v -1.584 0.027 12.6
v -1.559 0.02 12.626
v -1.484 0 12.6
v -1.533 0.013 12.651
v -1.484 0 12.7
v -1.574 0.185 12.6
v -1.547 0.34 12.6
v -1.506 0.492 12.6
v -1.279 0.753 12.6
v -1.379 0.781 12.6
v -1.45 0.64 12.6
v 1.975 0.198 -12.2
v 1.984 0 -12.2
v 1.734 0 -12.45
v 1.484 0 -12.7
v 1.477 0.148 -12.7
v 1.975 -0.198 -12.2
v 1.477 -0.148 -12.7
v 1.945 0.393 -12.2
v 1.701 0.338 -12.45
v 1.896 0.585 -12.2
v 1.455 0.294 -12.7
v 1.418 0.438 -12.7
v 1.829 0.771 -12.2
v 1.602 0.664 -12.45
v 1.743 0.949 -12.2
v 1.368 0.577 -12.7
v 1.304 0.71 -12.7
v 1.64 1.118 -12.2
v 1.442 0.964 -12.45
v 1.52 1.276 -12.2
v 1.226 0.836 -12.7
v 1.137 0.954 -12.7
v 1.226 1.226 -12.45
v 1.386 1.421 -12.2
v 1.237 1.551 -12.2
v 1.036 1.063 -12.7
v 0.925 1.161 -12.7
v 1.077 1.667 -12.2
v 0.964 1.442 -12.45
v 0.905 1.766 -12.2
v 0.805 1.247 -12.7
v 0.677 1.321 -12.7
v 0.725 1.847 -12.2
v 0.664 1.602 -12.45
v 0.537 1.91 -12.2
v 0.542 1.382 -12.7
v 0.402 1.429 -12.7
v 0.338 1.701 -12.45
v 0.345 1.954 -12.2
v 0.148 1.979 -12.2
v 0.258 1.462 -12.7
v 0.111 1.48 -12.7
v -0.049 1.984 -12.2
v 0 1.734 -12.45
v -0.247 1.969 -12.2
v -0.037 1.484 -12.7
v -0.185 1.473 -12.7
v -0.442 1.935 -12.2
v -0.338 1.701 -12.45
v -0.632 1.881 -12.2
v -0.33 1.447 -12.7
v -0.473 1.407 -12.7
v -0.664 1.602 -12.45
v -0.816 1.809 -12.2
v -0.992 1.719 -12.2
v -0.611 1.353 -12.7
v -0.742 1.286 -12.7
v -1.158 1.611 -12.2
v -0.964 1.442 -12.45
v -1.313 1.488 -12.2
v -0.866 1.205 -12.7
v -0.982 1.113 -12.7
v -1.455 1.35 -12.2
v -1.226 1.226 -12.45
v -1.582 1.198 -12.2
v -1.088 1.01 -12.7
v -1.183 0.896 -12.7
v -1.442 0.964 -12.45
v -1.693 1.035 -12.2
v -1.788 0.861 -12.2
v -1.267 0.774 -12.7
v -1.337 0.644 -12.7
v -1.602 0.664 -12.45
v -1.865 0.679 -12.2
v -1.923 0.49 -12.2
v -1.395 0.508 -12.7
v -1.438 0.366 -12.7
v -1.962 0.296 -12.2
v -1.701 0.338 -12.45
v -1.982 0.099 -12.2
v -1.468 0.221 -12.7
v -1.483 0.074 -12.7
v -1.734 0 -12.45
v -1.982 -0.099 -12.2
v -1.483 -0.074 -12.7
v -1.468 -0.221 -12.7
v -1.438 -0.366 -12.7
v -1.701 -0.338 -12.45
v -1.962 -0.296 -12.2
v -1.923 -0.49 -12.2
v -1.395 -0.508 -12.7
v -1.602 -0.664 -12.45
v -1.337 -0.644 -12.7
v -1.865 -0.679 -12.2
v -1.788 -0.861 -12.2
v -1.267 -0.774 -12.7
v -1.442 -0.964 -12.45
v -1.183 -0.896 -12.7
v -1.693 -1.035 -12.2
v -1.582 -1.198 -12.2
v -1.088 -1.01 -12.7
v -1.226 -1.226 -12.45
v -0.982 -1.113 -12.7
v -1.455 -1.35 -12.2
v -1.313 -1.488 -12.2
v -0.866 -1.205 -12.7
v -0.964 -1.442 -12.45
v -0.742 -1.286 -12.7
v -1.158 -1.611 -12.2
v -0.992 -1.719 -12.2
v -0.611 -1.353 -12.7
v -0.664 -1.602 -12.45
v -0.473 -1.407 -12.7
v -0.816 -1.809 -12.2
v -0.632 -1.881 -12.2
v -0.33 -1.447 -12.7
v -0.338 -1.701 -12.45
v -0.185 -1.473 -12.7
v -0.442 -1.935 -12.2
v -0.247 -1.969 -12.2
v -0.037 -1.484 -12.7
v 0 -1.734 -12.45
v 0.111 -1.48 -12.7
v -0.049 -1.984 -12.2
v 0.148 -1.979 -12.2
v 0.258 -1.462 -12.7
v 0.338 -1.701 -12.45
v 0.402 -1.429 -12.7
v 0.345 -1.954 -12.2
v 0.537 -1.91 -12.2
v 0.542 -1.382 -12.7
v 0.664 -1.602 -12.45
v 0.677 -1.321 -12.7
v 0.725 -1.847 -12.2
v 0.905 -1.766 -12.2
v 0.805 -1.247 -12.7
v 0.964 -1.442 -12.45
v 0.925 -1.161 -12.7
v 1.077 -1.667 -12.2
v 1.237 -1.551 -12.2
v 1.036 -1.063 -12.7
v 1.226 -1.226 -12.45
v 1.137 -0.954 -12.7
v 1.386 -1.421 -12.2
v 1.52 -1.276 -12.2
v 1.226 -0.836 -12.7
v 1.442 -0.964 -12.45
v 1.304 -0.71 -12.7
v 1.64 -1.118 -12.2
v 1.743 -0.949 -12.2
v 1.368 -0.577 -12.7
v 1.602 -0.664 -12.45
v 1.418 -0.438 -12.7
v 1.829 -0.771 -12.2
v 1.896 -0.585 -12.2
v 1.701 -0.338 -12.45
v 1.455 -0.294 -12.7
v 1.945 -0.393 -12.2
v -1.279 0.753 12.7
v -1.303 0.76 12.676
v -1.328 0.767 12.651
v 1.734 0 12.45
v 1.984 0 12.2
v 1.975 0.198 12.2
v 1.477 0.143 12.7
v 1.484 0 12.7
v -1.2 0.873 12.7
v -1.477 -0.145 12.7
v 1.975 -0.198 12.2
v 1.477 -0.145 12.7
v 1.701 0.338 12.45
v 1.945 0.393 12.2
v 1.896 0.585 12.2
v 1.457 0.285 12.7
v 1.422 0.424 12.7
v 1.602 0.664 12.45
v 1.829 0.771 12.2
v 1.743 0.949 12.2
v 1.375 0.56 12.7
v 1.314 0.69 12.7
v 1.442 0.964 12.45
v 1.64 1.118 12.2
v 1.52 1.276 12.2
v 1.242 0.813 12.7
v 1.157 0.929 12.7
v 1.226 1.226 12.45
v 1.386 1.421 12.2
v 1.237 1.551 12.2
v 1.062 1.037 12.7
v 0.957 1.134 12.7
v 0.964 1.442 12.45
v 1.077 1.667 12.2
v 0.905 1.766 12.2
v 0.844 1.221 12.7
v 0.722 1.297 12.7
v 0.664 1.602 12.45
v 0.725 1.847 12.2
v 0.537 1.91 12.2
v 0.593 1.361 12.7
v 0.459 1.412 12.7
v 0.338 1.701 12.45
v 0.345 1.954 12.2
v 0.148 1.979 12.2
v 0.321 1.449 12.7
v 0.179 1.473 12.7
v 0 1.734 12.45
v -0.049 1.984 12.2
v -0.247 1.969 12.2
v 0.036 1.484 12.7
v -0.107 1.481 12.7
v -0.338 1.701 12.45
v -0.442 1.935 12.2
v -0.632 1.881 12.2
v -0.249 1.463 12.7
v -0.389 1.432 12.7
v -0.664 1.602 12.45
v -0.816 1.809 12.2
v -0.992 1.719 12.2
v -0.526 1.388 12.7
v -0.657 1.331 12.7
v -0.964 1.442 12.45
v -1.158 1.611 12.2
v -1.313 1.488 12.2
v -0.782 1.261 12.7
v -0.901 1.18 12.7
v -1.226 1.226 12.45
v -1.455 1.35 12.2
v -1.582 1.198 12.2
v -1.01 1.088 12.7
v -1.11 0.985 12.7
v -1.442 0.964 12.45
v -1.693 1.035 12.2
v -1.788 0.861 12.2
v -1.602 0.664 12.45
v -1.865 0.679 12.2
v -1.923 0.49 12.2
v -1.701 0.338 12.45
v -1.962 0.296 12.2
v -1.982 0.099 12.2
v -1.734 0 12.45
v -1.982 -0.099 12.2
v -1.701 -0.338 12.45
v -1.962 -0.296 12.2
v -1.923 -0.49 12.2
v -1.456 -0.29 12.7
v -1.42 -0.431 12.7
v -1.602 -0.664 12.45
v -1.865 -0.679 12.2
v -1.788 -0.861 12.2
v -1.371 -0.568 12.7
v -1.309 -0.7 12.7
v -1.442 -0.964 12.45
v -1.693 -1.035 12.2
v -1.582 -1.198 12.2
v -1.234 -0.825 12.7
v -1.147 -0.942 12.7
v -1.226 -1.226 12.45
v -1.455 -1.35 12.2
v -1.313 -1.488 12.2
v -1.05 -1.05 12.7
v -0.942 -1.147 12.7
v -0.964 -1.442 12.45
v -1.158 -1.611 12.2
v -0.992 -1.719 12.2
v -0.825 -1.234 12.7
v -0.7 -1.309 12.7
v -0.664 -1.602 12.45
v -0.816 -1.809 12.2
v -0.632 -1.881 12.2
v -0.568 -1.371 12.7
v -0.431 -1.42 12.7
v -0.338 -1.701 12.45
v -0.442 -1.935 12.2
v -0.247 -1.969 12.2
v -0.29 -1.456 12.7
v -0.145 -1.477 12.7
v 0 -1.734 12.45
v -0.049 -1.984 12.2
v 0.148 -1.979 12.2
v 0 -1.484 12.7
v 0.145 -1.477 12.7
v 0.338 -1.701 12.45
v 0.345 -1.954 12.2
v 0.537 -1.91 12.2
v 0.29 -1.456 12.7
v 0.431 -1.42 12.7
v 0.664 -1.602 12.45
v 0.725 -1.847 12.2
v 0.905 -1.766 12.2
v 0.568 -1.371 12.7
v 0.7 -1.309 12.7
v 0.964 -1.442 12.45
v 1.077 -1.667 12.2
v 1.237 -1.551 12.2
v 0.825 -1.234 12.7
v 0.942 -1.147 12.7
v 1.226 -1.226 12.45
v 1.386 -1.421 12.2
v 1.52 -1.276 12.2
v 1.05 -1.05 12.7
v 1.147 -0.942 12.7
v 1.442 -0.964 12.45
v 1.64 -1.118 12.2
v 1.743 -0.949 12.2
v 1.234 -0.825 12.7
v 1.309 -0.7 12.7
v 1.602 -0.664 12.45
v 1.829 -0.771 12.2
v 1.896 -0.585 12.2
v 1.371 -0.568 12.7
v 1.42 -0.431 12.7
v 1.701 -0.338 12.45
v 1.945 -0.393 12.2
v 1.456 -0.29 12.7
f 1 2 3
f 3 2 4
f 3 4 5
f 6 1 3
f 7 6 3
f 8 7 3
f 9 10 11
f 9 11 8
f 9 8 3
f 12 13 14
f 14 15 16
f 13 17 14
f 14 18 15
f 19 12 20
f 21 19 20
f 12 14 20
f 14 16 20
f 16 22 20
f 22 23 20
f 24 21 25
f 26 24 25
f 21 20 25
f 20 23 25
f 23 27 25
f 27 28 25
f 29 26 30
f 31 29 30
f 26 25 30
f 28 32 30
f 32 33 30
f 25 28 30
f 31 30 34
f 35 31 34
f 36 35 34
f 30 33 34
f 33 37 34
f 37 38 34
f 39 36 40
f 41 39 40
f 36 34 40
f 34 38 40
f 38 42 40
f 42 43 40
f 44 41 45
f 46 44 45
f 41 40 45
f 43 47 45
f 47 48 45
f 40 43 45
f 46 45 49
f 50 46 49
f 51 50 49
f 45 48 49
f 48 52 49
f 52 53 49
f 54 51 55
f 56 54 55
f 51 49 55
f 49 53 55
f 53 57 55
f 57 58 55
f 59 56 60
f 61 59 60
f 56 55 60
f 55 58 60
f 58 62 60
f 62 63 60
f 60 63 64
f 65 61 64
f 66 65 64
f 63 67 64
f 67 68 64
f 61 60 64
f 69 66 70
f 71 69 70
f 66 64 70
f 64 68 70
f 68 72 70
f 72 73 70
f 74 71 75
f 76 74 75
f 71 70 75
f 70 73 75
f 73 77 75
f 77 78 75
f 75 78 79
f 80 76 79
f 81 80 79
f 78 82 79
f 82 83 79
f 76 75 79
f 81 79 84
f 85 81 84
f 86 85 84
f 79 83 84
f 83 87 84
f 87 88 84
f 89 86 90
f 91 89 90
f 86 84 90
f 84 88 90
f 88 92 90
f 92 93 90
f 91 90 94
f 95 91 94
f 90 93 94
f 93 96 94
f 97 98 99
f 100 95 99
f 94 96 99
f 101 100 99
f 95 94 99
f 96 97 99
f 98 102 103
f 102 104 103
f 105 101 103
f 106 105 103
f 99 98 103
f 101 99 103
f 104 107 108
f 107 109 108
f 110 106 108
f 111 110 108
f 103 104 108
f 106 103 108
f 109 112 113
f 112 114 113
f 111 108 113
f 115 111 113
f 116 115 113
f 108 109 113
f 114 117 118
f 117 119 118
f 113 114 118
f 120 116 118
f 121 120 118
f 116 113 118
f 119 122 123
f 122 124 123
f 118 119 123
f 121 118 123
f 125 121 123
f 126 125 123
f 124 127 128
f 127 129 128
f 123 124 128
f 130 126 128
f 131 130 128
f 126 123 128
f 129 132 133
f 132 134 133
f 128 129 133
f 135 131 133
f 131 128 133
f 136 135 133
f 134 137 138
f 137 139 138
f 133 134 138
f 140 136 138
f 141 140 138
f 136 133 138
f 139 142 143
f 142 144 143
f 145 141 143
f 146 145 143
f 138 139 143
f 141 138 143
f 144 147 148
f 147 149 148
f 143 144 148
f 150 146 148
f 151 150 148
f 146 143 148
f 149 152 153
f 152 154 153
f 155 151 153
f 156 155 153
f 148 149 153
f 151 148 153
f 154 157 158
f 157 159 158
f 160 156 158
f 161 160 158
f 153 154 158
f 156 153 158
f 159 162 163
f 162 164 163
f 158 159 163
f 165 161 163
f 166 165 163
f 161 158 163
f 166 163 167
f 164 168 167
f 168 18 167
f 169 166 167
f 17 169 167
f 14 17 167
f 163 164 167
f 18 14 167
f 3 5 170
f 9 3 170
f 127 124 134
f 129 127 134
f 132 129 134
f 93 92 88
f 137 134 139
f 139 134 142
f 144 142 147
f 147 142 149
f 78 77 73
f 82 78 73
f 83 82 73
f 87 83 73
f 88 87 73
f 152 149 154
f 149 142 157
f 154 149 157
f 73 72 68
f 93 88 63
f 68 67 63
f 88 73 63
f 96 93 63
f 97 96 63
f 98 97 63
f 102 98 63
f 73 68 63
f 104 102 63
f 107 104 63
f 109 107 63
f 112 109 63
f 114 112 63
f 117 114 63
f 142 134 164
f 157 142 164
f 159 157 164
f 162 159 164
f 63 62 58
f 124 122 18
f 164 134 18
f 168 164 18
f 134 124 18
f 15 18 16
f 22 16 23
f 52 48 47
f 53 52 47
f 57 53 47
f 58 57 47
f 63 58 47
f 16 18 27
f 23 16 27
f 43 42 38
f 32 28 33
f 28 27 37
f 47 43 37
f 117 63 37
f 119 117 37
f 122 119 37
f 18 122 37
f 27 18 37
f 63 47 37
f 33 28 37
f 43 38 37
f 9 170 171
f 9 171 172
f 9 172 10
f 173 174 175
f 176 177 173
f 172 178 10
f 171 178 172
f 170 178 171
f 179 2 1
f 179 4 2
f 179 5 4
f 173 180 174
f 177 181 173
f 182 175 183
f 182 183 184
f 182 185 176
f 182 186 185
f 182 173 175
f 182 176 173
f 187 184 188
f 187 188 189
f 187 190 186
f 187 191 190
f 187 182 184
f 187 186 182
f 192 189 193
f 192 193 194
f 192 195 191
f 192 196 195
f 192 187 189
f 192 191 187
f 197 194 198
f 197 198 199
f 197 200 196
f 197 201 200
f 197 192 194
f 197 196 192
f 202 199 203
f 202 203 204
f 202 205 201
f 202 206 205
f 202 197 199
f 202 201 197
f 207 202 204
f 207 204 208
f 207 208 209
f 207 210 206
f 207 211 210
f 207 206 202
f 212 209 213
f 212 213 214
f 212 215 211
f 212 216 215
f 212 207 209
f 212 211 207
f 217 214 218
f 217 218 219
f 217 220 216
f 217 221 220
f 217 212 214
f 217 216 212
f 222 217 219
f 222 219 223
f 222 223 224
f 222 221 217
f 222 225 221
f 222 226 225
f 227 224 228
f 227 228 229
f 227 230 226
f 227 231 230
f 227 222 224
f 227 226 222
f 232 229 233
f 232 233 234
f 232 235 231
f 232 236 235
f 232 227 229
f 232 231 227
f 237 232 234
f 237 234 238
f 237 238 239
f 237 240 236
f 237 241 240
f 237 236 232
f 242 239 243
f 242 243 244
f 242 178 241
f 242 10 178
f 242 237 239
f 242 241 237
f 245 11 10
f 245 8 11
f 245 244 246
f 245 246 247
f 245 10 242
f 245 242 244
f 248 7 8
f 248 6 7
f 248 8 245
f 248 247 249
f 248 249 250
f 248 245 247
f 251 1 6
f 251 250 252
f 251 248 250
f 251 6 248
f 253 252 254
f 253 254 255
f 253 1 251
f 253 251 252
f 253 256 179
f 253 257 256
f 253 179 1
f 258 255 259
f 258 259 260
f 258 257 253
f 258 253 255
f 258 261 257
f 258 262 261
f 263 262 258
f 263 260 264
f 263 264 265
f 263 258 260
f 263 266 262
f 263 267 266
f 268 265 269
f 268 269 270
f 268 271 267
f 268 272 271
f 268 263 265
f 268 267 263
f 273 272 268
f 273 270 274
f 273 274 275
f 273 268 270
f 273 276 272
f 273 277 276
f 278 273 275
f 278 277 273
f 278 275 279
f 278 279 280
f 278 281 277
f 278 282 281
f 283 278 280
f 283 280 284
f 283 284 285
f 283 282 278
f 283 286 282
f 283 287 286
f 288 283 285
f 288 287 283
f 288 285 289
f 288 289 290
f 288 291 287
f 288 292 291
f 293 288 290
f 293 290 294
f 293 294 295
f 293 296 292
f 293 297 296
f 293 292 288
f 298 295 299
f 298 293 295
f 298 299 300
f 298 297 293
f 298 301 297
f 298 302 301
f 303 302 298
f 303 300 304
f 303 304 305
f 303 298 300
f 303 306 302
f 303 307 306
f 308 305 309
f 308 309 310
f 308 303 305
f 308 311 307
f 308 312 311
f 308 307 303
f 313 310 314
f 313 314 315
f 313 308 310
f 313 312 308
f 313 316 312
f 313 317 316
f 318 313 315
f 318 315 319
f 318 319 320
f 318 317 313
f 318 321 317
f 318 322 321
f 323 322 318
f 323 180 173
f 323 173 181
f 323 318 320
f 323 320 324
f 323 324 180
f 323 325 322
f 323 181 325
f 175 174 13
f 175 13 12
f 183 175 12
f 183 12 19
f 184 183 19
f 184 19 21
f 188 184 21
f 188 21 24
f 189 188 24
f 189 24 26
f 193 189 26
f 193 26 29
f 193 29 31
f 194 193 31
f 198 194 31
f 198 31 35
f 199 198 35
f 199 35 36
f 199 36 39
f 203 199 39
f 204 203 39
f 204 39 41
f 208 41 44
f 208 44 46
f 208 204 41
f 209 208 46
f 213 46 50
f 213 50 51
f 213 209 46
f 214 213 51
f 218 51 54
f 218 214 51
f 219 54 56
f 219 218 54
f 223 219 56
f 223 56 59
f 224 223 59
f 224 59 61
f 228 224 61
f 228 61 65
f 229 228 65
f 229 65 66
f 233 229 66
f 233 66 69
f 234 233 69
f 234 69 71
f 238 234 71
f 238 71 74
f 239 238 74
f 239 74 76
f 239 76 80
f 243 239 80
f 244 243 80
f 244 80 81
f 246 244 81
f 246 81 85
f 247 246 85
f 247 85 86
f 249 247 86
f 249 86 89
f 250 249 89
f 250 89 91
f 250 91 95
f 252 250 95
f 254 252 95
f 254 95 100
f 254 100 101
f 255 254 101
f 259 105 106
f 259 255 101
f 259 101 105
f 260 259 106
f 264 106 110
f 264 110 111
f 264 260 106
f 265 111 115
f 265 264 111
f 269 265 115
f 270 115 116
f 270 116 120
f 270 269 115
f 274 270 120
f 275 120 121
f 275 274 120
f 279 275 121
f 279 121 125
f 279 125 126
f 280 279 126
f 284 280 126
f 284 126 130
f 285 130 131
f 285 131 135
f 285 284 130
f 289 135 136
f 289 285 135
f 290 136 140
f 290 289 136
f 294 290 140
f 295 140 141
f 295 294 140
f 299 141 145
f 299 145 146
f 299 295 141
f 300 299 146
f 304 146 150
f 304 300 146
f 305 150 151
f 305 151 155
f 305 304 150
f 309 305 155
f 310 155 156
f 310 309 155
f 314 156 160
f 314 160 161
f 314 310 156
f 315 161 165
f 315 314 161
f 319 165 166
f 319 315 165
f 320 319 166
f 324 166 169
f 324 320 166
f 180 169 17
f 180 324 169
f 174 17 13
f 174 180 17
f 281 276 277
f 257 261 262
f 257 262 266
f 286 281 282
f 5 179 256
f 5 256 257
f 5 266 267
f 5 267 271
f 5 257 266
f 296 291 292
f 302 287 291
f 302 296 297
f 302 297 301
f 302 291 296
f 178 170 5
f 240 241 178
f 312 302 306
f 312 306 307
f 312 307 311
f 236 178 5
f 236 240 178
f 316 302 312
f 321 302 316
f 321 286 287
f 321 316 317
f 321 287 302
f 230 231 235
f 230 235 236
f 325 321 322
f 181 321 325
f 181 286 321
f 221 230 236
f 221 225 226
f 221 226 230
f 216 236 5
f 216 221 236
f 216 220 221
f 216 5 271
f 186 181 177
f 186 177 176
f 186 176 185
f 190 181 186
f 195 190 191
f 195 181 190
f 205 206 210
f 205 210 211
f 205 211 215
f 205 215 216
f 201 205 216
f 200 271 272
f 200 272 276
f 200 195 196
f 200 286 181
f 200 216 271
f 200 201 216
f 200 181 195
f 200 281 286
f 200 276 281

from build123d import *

# Parameters (mm, degrees)
SKETCH1_R           = 1.984375
BOSS_EXTRUDE1_DEPTH = 12.7
CHAMFER1_SIZE       = 0.5
CUT_EXTRUDE2_DEPTH  = 0.1


with BuildPart() as part:
    # Sketch1 → Boss-Extrude1 (new, symmetric)
    with BuildSketch(Plane.XY):
        Circle(SKETCH1_R)
    extrude(amount=BOSS_EXTRUDE1_DEPTH, both=True)

    # Chamfer1
    chamfer1_edges = [part.edges().sort_by_distance(p)[0] for p in [
        (-1.984375, 0, -12.7),
        (-1.984375, 0, 12.7),
    ]]
    chamfer(chamfer1_edges, length=CHAMFER1_SIZE)

    # Sketch2 → Cut-Extrude2 (cut)
    with BuildSketch(Plane.XY.offset(12.7)):
        with BuildLine():
            ThreePointArc((-1.278959217, 0.753413872), (-1.432100595, 0.390457458), (-1.484375, 0))
            Line((-1.484375, 0), (-1.278959217, 0.753413872))
        make_face()
        with BuildLine():
            Line((-1.775379716, 0.079341467), (-1.484375, 0))
            ThreePointArc((-1.484375, 0), (-1.432100595, 0.390457458), (-1.278959217, 0.753413872))
            Line((-1.278959217, 0.753413872), (-1.569963933, 0.832755339))
            Line((-1.569963933, 0.832755339), (-1.775379716, 0.079341467))
        make_face()
    extrude(amount=-CUT_EXTRUDE2_DEPTH, mode=Mode.SUBTRACT)


solid = part.part
